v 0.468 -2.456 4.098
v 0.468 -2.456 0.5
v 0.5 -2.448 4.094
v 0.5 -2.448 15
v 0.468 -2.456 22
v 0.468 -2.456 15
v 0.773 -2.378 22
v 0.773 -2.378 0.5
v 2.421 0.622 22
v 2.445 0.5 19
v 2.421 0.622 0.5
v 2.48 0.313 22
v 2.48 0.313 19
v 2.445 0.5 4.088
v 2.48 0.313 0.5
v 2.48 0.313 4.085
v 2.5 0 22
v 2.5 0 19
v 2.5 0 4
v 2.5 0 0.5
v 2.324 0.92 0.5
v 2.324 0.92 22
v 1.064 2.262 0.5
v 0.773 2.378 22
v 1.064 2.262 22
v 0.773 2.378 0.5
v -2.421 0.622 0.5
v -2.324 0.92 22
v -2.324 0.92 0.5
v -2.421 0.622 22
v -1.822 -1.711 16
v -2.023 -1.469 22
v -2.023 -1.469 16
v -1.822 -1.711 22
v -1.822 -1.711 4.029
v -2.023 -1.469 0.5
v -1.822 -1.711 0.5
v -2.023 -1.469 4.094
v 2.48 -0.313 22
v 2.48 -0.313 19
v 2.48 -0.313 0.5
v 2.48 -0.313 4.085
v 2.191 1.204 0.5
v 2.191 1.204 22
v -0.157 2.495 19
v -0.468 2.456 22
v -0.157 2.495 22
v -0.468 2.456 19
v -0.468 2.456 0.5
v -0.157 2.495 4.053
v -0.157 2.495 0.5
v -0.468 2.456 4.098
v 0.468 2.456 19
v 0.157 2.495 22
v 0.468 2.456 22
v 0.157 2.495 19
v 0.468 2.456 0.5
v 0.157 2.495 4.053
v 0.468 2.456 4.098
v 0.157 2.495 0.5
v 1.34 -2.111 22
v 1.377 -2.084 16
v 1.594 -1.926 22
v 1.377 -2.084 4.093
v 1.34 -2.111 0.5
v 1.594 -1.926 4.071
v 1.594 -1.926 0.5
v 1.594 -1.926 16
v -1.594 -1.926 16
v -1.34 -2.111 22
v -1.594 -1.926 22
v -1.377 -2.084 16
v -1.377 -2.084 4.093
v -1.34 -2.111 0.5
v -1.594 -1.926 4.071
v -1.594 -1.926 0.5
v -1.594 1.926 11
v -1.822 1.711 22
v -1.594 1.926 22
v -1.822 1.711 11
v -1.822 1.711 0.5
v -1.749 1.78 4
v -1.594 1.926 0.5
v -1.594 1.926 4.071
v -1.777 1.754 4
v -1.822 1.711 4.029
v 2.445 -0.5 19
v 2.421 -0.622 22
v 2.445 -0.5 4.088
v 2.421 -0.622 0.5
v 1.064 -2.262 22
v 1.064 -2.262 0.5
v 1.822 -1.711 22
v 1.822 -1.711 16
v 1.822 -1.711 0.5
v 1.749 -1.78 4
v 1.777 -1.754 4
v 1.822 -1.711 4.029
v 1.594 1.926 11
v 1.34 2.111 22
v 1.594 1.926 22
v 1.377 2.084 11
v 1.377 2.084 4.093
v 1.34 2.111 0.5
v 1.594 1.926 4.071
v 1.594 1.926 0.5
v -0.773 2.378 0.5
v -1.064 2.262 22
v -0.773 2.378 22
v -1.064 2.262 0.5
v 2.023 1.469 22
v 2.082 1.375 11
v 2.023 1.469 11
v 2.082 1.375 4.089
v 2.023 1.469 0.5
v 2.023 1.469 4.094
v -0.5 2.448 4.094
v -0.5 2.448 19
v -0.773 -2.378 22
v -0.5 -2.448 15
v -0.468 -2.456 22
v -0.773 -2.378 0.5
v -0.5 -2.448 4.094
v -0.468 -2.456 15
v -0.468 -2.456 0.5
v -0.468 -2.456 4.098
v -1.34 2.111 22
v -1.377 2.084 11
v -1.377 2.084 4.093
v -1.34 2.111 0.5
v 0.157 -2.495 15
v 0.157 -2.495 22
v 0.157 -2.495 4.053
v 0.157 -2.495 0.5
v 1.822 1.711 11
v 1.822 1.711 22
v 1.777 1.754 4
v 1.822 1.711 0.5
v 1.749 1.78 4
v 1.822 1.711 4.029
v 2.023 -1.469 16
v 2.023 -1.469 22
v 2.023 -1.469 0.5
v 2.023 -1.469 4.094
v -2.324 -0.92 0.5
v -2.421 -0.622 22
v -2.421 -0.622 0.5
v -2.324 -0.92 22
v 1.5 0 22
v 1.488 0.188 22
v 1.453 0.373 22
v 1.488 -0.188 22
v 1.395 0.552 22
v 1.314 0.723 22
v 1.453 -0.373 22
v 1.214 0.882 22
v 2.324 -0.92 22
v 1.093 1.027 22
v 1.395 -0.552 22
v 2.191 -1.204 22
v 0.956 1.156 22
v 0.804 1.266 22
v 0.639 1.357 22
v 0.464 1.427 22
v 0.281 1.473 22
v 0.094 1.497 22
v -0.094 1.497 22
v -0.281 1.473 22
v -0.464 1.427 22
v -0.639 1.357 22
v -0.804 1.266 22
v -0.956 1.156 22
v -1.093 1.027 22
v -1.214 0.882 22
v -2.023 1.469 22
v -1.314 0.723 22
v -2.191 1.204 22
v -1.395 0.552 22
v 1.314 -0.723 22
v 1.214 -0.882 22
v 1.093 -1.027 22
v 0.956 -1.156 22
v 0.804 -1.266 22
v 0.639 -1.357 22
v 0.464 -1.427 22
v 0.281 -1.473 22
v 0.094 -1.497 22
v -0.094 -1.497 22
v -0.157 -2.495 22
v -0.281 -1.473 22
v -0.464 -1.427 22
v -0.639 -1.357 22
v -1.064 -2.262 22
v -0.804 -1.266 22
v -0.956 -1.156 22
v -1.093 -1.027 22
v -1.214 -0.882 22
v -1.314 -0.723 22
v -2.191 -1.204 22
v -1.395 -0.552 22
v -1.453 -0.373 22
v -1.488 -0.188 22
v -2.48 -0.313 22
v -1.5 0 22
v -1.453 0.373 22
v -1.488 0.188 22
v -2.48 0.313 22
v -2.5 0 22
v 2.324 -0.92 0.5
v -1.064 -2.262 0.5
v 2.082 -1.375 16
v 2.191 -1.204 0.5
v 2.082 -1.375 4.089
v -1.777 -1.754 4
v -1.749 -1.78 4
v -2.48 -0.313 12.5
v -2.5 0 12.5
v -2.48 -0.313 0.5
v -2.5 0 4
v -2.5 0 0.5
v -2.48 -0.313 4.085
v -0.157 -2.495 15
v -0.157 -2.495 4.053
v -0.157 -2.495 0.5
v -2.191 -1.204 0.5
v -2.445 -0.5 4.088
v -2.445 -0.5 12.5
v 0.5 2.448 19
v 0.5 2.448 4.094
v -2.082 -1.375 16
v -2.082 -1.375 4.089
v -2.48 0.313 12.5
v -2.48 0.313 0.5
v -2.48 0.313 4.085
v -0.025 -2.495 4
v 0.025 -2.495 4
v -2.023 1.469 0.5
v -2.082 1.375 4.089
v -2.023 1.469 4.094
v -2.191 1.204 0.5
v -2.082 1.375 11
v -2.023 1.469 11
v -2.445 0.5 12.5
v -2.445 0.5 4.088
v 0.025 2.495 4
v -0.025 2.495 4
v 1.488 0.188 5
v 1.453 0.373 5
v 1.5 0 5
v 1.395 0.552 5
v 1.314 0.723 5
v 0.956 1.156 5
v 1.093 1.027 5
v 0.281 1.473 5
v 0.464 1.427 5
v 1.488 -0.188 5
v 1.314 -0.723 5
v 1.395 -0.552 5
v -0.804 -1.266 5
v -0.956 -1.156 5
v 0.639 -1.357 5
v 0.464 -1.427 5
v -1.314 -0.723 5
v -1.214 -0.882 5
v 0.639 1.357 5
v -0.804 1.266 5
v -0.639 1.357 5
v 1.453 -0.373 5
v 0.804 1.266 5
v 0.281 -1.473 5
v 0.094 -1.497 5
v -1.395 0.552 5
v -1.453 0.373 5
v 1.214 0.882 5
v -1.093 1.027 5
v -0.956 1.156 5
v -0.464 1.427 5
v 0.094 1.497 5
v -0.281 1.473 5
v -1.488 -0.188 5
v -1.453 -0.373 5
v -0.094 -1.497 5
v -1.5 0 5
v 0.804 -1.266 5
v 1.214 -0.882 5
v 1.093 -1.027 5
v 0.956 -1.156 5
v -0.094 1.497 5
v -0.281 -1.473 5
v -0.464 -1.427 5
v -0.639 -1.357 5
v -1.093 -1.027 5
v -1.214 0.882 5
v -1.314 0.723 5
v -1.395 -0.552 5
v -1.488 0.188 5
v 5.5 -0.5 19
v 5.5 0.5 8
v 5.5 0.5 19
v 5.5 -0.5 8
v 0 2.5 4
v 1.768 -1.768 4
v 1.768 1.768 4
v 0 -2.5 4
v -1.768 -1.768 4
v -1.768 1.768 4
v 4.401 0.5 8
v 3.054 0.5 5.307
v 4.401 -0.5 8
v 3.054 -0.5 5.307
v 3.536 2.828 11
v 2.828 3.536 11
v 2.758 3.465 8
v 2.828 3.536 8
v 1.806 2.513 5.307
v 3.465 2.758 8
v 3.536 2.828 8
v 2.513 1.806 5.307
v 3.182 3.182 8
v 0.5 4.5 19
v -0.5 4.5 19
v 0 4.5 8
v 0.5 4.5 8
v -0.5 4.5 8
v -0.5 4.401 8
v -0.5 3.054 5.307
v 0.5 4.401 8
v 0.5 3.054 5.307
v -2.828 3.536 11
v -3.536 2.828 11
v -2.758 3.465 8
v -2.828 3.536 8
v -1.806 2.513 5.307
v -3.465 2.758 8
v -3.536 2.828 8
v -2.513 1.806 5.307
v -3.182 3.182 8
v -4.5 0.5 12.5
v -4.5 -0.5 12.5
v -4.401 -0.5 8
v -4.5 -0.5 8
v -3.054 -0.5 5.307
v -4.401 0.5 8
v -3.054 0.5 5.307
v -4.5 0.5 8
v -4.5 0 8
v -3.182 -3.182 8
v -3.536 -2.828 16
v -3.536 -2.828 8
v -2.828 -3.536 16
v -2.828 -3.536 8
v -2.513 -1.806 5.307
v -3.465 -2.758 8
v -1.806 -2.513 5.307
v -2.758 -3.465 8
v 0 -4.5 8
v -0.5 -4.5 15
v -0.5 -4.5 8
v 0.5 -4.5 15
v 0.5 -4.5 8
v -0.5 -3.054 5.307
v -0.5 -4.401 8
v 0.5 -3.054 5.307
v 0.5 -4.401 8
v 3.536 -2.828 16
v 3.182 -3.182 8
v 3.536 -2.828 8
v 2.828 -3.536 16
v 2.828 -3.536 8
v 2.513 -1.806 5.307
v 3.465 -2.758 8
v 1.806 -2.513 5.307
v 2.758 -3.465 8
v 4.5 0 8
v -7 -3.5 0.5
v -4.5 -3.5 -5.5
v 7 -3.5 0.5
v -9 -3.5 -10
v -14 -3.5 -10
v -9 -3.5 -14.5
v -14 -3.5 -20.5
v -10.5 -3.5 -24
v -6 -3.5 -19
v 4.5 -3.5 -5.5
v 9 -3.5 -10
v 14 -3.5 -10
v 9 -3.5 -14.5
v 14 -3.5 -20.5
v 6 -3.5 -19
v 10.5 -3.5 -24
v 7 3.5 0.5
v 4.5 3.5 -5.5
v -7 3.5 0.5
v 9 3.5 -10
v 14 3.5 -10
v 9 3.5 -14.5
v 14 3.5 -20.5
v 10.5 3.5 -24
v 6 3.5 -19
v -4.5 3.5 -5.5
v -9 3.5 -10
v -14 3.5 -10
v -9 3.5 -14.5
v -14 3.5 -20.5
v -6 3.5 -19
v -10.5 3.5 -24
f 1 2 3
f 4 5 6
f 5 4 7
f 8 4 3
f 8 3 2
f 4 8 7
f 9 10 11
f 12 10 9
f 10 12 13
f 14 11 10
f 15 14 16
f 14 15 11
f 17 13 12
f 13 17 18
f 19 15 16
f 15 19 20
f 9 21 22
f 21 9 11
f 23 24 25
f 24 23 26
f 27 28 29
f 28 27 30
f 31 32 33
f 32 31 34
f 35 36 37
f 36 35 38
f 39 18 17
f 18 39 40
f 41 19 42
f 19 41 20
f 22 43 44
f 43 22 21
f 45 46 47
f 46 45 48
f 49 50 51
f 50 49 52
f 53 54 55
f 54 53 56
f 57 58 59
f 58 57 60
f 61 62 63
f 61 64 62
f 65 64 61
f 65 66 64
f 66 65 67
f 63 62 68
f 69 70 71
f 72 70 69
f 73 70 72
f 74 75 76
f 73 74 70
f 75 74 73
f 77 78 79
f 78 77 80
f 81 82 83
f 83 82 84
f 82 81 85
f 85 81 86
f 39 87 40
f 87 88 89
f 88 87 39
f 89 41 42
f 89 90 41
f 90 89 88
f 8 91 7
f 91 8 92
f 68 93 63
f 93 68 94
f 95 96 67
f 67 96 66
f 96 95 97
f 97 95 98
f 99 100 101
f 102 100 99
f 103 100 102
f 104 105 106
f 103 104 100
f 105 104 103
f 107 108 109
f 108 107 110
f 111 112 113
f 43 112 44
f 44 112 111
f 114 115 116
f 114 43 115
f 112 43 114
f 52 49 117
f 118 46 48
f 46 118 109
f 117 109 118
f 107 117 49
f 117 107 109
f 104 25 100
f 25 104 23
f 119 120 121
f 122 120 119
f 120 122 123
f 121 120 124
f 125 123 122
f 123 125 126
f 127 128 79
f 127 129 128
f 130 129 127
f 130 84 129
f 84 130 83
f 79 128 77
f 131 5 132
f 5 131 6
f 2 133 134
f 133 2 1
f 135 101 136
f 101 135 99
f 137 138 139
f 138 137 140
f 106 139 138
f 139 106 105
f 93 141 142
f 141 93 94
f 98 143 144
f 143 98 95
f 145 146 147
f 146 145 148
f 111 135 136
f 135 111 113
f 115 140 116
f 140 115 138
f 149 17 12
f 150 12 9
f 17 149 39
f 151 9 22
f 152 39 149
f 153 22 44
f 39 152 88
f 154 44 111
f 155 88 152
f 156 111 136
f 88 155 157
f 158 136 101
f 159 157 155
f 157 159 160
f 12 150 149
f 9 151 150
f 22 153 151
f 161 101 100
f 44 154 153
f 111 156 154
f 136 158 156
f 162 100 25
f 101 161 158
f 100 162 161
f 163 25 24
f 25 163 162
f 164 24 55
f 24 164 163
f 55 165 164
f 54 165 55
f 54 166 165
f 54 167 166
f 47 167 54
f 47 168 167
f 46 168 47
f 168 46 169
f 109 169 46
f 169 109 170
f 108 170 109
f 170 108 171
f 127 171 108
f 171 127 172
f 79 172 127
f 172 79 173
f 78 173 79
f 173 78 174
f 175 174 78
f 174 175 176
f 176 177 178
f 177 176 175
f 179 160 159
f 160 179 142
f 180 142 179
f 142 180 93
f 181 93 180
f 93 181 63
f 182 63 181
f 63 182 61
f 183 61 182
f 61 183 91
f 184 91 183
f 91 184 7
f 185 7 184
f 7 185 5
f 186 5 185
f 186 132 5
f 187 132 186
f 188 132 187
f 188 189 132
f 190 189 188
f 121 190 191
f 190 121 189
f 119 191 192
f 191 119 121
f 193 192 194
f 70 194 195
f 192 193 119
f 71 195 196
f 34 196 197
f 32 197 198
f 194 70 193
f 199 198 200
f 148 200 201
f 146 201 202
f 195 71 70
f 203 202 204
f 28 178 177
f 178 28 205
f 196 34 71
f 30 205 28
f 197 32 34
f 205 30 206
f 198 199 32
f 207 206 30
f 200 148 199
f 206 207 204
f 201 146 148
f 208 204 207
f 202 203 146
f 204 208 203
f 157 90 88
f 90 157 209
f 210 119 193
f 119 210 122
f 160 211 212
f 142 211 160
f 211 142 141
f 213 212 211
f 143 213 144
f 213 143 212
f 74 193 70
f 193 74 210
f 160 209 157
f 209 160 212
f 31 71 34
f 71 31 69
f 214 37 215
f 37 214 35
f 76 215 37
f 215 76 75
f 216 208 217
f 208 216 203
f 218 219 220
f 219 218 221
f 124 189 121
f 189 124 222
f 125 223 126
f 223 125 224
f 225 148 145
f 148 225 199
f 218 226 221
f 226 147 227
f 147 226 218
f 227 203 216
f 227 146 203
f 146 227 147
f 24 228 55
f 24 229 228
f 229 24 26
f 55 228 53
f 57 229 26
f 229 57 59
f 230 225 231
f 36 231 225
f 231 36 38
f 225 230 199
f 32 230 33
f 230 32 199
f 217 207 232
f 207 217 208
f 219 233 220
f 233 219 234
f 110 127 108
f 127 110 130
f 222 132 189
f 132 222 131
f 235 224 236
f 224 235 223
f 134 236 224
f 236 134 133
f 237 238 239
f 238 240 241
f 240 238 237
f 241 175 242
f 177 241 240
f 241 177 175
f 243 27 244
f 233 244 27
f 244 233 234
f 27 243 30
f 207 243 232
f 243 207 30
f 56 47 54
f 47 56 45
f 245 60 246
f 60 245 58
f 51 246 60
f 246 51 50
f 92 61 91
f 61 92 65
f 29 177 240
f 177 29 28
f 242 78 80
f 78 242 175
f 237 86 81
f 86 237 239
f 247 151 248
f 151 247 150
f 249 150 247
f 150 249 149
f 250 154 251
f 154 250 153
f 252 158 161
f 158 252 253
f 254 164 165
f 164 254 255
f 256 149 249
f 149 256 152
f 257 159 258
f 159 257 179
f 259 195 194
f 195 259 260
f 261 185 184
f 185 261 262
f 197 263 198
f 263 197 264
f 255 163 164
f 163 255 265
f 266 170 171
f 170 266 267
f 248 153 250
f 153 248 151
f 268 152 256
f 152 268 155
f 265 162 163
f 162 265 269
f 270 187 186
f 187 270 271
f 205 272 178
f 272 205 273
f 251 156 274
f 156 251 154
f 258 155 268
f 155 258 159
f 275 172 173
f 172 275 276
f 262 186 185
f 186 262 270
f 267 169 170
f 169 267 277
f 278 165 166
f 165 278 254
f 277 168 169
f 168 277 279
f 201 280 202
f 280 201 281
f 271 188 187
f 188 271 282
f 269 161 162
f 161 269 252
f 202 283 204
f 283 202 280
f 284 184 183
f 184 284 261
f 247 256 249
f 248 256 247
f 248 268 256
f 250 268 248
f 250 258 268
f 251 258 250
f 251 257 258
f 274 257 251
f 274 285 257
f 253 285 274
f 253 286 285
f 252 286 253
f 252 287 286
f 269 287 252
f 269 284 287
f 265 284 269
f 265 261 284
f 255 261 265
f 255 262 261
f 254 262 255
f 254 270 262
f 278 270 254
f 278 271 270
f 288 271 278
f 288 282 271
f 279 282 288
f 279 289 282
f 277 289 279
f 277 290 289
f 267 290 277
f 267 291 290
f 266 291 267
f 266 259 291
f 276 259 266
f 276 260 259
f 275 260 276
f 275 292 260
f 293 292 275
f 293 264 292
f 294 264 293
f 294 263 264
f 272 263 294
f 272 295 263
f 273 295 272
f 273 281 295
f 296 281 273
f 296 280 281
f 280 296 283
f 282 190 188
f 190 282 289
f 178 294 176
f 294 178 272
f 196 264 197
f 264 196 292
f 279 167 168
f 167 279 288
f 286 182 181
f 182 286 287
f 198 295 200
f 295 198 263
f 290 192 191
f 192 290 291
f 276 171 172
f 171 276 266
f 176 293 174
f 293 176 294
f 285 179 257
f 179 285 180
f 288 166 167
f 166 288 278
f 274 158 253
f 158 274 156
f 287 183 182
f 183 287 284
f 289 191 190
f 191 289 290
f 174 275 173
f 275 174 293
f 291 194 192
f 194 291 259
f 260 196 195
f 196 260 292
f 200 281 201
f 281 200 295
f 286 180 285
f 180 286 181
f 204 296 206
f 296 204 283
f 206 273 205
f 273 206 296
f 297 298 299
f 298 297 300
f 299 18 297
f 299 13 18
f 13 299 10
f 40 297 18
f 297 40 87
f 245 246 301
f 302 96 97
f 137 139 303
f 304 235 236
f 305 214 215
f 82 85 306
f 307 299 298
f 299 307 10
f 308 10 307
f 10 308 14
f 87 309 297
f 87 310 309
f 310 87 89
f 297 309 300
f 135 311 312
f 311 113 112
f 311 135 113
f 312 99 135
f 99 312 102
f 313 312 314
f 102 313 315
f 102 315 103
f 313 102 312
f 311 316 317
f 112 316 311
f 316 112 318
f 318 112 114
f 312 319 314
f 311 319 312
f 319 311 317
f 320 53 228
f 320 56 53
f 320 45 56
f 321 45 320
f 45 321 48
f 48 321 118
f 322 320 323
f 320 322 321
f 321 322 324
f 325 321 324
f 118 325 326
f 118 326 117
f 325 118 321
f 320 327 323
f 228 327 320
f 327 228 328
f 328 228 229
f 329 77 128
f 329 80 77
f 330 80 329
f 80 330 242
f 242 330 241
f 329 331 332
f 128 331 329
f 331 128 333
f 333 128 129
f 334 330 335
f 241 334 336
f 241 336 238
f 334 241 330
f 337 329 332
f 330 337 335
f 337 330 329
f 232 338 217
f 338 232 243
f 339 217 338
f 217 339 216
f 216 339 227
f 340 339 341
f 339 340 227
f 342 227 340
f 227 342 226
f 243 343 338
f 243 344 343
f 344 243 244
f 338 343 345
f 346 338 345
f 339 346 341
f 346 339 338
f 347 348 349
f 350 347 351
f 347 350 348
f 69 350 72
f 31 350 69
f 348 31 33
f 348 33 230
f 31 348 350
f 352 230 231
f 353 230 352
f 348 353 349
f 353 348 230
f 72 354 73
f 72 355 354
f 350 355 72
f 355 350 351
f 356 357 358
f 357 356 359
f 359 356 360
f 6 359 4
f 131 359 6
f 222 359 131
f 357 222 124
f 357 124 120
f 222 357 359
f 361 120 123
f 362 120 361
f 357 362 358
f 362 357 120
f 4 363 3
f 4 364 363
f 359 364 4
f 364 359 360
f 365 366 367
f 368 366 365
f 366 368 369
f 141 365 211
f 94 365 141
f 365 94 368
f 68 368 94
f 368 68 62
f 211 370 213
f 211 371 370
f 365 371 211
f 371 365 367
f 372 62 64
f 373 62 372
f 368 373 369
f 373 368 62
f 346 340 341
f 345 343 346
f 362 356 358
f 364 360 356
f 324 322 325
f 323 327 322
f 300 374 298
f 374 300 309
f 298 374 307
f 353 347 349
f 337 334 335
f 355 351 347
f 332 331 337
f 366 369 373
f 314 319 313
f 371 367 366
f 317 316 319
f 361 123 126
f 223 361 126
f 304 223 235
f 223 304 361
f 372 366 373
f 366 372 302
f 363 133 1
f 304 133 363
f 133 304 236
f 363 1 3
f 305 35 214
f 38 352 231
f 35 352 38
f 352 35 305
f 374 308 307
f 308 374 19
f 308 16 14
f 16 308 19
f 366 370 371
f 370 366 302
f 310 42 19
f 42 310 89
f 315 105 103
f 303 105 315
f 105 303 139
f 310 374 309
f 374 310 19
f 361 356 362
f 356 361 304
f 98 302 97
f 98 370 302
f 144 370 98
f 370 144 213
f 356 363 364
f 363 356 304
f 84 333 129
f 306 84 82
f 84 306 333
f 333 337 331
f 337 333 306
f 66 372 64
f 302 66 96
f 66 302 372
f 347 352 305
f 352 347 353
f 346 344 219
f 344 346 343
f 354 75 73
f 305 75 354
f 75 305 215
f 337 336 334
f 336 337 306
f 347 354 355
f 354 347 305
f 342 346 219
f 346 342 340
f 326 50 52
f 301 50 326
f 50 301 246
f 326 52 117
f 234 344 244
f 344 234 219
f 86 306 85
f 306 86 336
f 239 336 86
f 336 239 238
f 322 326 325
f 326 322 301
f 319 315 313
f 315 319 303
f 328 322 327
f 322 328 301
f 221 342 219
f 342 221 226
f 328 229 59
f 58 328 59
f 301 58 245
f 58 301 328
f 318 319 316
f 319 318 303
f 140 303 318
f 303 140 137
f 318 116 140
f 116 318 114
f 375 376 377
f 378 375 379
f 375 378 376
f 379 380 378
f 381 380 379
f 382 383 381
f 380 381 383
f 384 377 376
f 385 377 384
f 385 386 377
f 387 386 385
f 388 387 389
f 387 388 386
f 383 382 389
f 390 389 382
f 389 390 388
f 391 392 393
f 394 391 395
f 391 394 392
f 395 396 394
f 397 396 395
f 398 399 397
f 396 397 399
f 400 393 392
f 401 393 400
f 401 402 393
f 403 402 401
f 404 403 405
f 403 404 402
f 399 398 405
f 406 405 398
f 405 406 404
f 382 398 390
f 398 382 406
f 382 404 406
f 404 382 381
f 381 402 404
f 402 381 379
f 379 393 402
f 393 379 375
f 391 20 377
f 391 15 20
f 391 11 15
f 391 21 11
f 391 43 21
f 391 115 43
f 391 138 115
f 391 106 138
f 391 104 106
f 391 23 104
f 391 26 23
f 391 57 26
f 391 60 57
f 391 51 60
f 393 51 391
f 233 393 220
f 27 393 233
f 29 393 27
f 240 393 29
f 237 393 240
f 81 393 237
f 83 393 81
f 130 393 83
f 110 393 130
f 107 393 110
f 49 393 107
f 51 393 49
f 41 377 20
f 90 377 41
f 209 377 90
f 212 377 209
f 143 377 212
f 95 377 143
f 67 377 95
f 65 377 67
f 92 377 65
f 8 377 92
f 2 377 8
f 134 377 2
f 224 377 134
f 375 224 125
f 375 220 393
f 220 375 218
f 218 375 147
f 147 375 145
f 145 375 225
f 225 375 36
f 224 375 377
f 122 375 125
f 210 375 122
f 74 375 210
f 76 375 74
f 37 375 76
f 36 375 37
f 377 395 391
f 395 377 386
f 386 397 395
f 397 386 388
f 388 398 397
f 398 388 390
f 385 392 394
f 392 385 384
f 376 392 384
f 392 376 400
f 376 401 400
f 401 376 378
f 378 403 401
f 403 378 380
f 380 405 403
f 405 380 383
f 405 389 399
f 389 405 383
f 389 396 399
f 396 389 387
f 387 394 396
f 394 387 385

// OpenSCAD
// Documentation Générer une clef Pollux 7
// =========================
//
// création d'une copie d'une clef Pollux basée sur les coupes en mm
// paramètres :
// un, deux, trois, quatre, cinq, six, sept
//
// manche: bool, de base true si on le specifie à false, créer un petit manche pour des impréssions plus rapide
//
// Vue de face de la clef :
//
//          4
//       5     3
//     6         2
//       7     1
//         |_|
//
// Utilisation:
// ------
//
// appel du module :
//
//     clef_pollux7(un, deux, trois, quatre, cinq, six, sept);
//
// Example:
// --------
//
//     clef_pollux7(8,0,8,6.5,3,4,3);
//     clef_pollux7(8,0,8,6.5,3,4,3, manche=false);

module clef_pollux7(un, deux, trois, quatre, cinq, six, sept, manche=true){
    union() {
       rotate([0,0,90]){ 
            if (manche) {
                // Handle
                rotate([0, 90, 0]) translate([10, 0, - 3.5]) {
                    linear_extrude(7) {
                        difference() {
                            scale(0.7) polygon(points = [[- 15, - 10], [0, - 20], [15, - 20], [20, - 15], [20, 15], [15, 20]
                                , [0, 20], [- 15, 10]]);
                            scale(0.3) polygon(points = [[- 15, - 15], [0, - 30], [15, - 30], [30, - 20], [30, 20], [15, 30]
                                , [0, 30], [- 15, 15]]);
                        }
                    }
                }
            }
            else {
                //small handle
                translate([- 4, - 7, - 5]) cube([8, 14, 5]);
            }
        }
        // shape kiz
            difference() {
                cylinder(22, 2.5, 2.5, $fn = 50);  // Outer cylinder
                translate([0,0,5]) cylinder(18, 1.5, 1.5, $fn = 50);  // Inner cylinder
            }
            // ajout des barres de combinaison de la clef ( 8 barres, 360°/8 pour l'angle de rotation entre chaque barre la 1 est l'entraineur)
            translate([0,0,4]){
                blankHeight = 12 + 3; // 14 is the blank size, 3 is the already cut part on the key
                 // barre 1
                
        difference(){
            union() {
                translate([2,-0.5,0]) cube([3.5, 1, blankHeight]);
                // barre 2
                rotate([0,0,45]) translate([2,-0.5,0]) cube([2.5, 1, blankHeight-un]);
                // barre 3
                rotate([0,0,45*2]) translate([2,-0.5,0]) cube([2.5, 1, blankHeight-deux]);
                // barre 4
                rotate([0,0,45*3]) translate([2,-0.5,0]) cube([2.5, 1, blankHeight-trois]);
                // barre 5
                rotate([0,0,45*4]) translate([2,-0.5,0]) cube([2.5, 1, blankHeight-quatre]);
                // barre 6
                rotate([0,0,45*5]) translate([2,-0.5,0]) cube([2.5, 1, blankHeight-cinq]);
                // barre 7
                rotate([0,0,45*6]) translate([2,-0.5,0]) cube([2.5, 1, blankHeight-six]);
                // barre 8
                rotate([0,0,45*7]) translate([2,-0.5,0]) cube([2.5, 1, blankHeight-sept]);
            }
            
        difference(){
            cylinder(4,6,6);
            cylinder(5,2.5,5);
            }
        }
    }}
}

clef_pollux7(8,0,8,6.5,3,4,3);
